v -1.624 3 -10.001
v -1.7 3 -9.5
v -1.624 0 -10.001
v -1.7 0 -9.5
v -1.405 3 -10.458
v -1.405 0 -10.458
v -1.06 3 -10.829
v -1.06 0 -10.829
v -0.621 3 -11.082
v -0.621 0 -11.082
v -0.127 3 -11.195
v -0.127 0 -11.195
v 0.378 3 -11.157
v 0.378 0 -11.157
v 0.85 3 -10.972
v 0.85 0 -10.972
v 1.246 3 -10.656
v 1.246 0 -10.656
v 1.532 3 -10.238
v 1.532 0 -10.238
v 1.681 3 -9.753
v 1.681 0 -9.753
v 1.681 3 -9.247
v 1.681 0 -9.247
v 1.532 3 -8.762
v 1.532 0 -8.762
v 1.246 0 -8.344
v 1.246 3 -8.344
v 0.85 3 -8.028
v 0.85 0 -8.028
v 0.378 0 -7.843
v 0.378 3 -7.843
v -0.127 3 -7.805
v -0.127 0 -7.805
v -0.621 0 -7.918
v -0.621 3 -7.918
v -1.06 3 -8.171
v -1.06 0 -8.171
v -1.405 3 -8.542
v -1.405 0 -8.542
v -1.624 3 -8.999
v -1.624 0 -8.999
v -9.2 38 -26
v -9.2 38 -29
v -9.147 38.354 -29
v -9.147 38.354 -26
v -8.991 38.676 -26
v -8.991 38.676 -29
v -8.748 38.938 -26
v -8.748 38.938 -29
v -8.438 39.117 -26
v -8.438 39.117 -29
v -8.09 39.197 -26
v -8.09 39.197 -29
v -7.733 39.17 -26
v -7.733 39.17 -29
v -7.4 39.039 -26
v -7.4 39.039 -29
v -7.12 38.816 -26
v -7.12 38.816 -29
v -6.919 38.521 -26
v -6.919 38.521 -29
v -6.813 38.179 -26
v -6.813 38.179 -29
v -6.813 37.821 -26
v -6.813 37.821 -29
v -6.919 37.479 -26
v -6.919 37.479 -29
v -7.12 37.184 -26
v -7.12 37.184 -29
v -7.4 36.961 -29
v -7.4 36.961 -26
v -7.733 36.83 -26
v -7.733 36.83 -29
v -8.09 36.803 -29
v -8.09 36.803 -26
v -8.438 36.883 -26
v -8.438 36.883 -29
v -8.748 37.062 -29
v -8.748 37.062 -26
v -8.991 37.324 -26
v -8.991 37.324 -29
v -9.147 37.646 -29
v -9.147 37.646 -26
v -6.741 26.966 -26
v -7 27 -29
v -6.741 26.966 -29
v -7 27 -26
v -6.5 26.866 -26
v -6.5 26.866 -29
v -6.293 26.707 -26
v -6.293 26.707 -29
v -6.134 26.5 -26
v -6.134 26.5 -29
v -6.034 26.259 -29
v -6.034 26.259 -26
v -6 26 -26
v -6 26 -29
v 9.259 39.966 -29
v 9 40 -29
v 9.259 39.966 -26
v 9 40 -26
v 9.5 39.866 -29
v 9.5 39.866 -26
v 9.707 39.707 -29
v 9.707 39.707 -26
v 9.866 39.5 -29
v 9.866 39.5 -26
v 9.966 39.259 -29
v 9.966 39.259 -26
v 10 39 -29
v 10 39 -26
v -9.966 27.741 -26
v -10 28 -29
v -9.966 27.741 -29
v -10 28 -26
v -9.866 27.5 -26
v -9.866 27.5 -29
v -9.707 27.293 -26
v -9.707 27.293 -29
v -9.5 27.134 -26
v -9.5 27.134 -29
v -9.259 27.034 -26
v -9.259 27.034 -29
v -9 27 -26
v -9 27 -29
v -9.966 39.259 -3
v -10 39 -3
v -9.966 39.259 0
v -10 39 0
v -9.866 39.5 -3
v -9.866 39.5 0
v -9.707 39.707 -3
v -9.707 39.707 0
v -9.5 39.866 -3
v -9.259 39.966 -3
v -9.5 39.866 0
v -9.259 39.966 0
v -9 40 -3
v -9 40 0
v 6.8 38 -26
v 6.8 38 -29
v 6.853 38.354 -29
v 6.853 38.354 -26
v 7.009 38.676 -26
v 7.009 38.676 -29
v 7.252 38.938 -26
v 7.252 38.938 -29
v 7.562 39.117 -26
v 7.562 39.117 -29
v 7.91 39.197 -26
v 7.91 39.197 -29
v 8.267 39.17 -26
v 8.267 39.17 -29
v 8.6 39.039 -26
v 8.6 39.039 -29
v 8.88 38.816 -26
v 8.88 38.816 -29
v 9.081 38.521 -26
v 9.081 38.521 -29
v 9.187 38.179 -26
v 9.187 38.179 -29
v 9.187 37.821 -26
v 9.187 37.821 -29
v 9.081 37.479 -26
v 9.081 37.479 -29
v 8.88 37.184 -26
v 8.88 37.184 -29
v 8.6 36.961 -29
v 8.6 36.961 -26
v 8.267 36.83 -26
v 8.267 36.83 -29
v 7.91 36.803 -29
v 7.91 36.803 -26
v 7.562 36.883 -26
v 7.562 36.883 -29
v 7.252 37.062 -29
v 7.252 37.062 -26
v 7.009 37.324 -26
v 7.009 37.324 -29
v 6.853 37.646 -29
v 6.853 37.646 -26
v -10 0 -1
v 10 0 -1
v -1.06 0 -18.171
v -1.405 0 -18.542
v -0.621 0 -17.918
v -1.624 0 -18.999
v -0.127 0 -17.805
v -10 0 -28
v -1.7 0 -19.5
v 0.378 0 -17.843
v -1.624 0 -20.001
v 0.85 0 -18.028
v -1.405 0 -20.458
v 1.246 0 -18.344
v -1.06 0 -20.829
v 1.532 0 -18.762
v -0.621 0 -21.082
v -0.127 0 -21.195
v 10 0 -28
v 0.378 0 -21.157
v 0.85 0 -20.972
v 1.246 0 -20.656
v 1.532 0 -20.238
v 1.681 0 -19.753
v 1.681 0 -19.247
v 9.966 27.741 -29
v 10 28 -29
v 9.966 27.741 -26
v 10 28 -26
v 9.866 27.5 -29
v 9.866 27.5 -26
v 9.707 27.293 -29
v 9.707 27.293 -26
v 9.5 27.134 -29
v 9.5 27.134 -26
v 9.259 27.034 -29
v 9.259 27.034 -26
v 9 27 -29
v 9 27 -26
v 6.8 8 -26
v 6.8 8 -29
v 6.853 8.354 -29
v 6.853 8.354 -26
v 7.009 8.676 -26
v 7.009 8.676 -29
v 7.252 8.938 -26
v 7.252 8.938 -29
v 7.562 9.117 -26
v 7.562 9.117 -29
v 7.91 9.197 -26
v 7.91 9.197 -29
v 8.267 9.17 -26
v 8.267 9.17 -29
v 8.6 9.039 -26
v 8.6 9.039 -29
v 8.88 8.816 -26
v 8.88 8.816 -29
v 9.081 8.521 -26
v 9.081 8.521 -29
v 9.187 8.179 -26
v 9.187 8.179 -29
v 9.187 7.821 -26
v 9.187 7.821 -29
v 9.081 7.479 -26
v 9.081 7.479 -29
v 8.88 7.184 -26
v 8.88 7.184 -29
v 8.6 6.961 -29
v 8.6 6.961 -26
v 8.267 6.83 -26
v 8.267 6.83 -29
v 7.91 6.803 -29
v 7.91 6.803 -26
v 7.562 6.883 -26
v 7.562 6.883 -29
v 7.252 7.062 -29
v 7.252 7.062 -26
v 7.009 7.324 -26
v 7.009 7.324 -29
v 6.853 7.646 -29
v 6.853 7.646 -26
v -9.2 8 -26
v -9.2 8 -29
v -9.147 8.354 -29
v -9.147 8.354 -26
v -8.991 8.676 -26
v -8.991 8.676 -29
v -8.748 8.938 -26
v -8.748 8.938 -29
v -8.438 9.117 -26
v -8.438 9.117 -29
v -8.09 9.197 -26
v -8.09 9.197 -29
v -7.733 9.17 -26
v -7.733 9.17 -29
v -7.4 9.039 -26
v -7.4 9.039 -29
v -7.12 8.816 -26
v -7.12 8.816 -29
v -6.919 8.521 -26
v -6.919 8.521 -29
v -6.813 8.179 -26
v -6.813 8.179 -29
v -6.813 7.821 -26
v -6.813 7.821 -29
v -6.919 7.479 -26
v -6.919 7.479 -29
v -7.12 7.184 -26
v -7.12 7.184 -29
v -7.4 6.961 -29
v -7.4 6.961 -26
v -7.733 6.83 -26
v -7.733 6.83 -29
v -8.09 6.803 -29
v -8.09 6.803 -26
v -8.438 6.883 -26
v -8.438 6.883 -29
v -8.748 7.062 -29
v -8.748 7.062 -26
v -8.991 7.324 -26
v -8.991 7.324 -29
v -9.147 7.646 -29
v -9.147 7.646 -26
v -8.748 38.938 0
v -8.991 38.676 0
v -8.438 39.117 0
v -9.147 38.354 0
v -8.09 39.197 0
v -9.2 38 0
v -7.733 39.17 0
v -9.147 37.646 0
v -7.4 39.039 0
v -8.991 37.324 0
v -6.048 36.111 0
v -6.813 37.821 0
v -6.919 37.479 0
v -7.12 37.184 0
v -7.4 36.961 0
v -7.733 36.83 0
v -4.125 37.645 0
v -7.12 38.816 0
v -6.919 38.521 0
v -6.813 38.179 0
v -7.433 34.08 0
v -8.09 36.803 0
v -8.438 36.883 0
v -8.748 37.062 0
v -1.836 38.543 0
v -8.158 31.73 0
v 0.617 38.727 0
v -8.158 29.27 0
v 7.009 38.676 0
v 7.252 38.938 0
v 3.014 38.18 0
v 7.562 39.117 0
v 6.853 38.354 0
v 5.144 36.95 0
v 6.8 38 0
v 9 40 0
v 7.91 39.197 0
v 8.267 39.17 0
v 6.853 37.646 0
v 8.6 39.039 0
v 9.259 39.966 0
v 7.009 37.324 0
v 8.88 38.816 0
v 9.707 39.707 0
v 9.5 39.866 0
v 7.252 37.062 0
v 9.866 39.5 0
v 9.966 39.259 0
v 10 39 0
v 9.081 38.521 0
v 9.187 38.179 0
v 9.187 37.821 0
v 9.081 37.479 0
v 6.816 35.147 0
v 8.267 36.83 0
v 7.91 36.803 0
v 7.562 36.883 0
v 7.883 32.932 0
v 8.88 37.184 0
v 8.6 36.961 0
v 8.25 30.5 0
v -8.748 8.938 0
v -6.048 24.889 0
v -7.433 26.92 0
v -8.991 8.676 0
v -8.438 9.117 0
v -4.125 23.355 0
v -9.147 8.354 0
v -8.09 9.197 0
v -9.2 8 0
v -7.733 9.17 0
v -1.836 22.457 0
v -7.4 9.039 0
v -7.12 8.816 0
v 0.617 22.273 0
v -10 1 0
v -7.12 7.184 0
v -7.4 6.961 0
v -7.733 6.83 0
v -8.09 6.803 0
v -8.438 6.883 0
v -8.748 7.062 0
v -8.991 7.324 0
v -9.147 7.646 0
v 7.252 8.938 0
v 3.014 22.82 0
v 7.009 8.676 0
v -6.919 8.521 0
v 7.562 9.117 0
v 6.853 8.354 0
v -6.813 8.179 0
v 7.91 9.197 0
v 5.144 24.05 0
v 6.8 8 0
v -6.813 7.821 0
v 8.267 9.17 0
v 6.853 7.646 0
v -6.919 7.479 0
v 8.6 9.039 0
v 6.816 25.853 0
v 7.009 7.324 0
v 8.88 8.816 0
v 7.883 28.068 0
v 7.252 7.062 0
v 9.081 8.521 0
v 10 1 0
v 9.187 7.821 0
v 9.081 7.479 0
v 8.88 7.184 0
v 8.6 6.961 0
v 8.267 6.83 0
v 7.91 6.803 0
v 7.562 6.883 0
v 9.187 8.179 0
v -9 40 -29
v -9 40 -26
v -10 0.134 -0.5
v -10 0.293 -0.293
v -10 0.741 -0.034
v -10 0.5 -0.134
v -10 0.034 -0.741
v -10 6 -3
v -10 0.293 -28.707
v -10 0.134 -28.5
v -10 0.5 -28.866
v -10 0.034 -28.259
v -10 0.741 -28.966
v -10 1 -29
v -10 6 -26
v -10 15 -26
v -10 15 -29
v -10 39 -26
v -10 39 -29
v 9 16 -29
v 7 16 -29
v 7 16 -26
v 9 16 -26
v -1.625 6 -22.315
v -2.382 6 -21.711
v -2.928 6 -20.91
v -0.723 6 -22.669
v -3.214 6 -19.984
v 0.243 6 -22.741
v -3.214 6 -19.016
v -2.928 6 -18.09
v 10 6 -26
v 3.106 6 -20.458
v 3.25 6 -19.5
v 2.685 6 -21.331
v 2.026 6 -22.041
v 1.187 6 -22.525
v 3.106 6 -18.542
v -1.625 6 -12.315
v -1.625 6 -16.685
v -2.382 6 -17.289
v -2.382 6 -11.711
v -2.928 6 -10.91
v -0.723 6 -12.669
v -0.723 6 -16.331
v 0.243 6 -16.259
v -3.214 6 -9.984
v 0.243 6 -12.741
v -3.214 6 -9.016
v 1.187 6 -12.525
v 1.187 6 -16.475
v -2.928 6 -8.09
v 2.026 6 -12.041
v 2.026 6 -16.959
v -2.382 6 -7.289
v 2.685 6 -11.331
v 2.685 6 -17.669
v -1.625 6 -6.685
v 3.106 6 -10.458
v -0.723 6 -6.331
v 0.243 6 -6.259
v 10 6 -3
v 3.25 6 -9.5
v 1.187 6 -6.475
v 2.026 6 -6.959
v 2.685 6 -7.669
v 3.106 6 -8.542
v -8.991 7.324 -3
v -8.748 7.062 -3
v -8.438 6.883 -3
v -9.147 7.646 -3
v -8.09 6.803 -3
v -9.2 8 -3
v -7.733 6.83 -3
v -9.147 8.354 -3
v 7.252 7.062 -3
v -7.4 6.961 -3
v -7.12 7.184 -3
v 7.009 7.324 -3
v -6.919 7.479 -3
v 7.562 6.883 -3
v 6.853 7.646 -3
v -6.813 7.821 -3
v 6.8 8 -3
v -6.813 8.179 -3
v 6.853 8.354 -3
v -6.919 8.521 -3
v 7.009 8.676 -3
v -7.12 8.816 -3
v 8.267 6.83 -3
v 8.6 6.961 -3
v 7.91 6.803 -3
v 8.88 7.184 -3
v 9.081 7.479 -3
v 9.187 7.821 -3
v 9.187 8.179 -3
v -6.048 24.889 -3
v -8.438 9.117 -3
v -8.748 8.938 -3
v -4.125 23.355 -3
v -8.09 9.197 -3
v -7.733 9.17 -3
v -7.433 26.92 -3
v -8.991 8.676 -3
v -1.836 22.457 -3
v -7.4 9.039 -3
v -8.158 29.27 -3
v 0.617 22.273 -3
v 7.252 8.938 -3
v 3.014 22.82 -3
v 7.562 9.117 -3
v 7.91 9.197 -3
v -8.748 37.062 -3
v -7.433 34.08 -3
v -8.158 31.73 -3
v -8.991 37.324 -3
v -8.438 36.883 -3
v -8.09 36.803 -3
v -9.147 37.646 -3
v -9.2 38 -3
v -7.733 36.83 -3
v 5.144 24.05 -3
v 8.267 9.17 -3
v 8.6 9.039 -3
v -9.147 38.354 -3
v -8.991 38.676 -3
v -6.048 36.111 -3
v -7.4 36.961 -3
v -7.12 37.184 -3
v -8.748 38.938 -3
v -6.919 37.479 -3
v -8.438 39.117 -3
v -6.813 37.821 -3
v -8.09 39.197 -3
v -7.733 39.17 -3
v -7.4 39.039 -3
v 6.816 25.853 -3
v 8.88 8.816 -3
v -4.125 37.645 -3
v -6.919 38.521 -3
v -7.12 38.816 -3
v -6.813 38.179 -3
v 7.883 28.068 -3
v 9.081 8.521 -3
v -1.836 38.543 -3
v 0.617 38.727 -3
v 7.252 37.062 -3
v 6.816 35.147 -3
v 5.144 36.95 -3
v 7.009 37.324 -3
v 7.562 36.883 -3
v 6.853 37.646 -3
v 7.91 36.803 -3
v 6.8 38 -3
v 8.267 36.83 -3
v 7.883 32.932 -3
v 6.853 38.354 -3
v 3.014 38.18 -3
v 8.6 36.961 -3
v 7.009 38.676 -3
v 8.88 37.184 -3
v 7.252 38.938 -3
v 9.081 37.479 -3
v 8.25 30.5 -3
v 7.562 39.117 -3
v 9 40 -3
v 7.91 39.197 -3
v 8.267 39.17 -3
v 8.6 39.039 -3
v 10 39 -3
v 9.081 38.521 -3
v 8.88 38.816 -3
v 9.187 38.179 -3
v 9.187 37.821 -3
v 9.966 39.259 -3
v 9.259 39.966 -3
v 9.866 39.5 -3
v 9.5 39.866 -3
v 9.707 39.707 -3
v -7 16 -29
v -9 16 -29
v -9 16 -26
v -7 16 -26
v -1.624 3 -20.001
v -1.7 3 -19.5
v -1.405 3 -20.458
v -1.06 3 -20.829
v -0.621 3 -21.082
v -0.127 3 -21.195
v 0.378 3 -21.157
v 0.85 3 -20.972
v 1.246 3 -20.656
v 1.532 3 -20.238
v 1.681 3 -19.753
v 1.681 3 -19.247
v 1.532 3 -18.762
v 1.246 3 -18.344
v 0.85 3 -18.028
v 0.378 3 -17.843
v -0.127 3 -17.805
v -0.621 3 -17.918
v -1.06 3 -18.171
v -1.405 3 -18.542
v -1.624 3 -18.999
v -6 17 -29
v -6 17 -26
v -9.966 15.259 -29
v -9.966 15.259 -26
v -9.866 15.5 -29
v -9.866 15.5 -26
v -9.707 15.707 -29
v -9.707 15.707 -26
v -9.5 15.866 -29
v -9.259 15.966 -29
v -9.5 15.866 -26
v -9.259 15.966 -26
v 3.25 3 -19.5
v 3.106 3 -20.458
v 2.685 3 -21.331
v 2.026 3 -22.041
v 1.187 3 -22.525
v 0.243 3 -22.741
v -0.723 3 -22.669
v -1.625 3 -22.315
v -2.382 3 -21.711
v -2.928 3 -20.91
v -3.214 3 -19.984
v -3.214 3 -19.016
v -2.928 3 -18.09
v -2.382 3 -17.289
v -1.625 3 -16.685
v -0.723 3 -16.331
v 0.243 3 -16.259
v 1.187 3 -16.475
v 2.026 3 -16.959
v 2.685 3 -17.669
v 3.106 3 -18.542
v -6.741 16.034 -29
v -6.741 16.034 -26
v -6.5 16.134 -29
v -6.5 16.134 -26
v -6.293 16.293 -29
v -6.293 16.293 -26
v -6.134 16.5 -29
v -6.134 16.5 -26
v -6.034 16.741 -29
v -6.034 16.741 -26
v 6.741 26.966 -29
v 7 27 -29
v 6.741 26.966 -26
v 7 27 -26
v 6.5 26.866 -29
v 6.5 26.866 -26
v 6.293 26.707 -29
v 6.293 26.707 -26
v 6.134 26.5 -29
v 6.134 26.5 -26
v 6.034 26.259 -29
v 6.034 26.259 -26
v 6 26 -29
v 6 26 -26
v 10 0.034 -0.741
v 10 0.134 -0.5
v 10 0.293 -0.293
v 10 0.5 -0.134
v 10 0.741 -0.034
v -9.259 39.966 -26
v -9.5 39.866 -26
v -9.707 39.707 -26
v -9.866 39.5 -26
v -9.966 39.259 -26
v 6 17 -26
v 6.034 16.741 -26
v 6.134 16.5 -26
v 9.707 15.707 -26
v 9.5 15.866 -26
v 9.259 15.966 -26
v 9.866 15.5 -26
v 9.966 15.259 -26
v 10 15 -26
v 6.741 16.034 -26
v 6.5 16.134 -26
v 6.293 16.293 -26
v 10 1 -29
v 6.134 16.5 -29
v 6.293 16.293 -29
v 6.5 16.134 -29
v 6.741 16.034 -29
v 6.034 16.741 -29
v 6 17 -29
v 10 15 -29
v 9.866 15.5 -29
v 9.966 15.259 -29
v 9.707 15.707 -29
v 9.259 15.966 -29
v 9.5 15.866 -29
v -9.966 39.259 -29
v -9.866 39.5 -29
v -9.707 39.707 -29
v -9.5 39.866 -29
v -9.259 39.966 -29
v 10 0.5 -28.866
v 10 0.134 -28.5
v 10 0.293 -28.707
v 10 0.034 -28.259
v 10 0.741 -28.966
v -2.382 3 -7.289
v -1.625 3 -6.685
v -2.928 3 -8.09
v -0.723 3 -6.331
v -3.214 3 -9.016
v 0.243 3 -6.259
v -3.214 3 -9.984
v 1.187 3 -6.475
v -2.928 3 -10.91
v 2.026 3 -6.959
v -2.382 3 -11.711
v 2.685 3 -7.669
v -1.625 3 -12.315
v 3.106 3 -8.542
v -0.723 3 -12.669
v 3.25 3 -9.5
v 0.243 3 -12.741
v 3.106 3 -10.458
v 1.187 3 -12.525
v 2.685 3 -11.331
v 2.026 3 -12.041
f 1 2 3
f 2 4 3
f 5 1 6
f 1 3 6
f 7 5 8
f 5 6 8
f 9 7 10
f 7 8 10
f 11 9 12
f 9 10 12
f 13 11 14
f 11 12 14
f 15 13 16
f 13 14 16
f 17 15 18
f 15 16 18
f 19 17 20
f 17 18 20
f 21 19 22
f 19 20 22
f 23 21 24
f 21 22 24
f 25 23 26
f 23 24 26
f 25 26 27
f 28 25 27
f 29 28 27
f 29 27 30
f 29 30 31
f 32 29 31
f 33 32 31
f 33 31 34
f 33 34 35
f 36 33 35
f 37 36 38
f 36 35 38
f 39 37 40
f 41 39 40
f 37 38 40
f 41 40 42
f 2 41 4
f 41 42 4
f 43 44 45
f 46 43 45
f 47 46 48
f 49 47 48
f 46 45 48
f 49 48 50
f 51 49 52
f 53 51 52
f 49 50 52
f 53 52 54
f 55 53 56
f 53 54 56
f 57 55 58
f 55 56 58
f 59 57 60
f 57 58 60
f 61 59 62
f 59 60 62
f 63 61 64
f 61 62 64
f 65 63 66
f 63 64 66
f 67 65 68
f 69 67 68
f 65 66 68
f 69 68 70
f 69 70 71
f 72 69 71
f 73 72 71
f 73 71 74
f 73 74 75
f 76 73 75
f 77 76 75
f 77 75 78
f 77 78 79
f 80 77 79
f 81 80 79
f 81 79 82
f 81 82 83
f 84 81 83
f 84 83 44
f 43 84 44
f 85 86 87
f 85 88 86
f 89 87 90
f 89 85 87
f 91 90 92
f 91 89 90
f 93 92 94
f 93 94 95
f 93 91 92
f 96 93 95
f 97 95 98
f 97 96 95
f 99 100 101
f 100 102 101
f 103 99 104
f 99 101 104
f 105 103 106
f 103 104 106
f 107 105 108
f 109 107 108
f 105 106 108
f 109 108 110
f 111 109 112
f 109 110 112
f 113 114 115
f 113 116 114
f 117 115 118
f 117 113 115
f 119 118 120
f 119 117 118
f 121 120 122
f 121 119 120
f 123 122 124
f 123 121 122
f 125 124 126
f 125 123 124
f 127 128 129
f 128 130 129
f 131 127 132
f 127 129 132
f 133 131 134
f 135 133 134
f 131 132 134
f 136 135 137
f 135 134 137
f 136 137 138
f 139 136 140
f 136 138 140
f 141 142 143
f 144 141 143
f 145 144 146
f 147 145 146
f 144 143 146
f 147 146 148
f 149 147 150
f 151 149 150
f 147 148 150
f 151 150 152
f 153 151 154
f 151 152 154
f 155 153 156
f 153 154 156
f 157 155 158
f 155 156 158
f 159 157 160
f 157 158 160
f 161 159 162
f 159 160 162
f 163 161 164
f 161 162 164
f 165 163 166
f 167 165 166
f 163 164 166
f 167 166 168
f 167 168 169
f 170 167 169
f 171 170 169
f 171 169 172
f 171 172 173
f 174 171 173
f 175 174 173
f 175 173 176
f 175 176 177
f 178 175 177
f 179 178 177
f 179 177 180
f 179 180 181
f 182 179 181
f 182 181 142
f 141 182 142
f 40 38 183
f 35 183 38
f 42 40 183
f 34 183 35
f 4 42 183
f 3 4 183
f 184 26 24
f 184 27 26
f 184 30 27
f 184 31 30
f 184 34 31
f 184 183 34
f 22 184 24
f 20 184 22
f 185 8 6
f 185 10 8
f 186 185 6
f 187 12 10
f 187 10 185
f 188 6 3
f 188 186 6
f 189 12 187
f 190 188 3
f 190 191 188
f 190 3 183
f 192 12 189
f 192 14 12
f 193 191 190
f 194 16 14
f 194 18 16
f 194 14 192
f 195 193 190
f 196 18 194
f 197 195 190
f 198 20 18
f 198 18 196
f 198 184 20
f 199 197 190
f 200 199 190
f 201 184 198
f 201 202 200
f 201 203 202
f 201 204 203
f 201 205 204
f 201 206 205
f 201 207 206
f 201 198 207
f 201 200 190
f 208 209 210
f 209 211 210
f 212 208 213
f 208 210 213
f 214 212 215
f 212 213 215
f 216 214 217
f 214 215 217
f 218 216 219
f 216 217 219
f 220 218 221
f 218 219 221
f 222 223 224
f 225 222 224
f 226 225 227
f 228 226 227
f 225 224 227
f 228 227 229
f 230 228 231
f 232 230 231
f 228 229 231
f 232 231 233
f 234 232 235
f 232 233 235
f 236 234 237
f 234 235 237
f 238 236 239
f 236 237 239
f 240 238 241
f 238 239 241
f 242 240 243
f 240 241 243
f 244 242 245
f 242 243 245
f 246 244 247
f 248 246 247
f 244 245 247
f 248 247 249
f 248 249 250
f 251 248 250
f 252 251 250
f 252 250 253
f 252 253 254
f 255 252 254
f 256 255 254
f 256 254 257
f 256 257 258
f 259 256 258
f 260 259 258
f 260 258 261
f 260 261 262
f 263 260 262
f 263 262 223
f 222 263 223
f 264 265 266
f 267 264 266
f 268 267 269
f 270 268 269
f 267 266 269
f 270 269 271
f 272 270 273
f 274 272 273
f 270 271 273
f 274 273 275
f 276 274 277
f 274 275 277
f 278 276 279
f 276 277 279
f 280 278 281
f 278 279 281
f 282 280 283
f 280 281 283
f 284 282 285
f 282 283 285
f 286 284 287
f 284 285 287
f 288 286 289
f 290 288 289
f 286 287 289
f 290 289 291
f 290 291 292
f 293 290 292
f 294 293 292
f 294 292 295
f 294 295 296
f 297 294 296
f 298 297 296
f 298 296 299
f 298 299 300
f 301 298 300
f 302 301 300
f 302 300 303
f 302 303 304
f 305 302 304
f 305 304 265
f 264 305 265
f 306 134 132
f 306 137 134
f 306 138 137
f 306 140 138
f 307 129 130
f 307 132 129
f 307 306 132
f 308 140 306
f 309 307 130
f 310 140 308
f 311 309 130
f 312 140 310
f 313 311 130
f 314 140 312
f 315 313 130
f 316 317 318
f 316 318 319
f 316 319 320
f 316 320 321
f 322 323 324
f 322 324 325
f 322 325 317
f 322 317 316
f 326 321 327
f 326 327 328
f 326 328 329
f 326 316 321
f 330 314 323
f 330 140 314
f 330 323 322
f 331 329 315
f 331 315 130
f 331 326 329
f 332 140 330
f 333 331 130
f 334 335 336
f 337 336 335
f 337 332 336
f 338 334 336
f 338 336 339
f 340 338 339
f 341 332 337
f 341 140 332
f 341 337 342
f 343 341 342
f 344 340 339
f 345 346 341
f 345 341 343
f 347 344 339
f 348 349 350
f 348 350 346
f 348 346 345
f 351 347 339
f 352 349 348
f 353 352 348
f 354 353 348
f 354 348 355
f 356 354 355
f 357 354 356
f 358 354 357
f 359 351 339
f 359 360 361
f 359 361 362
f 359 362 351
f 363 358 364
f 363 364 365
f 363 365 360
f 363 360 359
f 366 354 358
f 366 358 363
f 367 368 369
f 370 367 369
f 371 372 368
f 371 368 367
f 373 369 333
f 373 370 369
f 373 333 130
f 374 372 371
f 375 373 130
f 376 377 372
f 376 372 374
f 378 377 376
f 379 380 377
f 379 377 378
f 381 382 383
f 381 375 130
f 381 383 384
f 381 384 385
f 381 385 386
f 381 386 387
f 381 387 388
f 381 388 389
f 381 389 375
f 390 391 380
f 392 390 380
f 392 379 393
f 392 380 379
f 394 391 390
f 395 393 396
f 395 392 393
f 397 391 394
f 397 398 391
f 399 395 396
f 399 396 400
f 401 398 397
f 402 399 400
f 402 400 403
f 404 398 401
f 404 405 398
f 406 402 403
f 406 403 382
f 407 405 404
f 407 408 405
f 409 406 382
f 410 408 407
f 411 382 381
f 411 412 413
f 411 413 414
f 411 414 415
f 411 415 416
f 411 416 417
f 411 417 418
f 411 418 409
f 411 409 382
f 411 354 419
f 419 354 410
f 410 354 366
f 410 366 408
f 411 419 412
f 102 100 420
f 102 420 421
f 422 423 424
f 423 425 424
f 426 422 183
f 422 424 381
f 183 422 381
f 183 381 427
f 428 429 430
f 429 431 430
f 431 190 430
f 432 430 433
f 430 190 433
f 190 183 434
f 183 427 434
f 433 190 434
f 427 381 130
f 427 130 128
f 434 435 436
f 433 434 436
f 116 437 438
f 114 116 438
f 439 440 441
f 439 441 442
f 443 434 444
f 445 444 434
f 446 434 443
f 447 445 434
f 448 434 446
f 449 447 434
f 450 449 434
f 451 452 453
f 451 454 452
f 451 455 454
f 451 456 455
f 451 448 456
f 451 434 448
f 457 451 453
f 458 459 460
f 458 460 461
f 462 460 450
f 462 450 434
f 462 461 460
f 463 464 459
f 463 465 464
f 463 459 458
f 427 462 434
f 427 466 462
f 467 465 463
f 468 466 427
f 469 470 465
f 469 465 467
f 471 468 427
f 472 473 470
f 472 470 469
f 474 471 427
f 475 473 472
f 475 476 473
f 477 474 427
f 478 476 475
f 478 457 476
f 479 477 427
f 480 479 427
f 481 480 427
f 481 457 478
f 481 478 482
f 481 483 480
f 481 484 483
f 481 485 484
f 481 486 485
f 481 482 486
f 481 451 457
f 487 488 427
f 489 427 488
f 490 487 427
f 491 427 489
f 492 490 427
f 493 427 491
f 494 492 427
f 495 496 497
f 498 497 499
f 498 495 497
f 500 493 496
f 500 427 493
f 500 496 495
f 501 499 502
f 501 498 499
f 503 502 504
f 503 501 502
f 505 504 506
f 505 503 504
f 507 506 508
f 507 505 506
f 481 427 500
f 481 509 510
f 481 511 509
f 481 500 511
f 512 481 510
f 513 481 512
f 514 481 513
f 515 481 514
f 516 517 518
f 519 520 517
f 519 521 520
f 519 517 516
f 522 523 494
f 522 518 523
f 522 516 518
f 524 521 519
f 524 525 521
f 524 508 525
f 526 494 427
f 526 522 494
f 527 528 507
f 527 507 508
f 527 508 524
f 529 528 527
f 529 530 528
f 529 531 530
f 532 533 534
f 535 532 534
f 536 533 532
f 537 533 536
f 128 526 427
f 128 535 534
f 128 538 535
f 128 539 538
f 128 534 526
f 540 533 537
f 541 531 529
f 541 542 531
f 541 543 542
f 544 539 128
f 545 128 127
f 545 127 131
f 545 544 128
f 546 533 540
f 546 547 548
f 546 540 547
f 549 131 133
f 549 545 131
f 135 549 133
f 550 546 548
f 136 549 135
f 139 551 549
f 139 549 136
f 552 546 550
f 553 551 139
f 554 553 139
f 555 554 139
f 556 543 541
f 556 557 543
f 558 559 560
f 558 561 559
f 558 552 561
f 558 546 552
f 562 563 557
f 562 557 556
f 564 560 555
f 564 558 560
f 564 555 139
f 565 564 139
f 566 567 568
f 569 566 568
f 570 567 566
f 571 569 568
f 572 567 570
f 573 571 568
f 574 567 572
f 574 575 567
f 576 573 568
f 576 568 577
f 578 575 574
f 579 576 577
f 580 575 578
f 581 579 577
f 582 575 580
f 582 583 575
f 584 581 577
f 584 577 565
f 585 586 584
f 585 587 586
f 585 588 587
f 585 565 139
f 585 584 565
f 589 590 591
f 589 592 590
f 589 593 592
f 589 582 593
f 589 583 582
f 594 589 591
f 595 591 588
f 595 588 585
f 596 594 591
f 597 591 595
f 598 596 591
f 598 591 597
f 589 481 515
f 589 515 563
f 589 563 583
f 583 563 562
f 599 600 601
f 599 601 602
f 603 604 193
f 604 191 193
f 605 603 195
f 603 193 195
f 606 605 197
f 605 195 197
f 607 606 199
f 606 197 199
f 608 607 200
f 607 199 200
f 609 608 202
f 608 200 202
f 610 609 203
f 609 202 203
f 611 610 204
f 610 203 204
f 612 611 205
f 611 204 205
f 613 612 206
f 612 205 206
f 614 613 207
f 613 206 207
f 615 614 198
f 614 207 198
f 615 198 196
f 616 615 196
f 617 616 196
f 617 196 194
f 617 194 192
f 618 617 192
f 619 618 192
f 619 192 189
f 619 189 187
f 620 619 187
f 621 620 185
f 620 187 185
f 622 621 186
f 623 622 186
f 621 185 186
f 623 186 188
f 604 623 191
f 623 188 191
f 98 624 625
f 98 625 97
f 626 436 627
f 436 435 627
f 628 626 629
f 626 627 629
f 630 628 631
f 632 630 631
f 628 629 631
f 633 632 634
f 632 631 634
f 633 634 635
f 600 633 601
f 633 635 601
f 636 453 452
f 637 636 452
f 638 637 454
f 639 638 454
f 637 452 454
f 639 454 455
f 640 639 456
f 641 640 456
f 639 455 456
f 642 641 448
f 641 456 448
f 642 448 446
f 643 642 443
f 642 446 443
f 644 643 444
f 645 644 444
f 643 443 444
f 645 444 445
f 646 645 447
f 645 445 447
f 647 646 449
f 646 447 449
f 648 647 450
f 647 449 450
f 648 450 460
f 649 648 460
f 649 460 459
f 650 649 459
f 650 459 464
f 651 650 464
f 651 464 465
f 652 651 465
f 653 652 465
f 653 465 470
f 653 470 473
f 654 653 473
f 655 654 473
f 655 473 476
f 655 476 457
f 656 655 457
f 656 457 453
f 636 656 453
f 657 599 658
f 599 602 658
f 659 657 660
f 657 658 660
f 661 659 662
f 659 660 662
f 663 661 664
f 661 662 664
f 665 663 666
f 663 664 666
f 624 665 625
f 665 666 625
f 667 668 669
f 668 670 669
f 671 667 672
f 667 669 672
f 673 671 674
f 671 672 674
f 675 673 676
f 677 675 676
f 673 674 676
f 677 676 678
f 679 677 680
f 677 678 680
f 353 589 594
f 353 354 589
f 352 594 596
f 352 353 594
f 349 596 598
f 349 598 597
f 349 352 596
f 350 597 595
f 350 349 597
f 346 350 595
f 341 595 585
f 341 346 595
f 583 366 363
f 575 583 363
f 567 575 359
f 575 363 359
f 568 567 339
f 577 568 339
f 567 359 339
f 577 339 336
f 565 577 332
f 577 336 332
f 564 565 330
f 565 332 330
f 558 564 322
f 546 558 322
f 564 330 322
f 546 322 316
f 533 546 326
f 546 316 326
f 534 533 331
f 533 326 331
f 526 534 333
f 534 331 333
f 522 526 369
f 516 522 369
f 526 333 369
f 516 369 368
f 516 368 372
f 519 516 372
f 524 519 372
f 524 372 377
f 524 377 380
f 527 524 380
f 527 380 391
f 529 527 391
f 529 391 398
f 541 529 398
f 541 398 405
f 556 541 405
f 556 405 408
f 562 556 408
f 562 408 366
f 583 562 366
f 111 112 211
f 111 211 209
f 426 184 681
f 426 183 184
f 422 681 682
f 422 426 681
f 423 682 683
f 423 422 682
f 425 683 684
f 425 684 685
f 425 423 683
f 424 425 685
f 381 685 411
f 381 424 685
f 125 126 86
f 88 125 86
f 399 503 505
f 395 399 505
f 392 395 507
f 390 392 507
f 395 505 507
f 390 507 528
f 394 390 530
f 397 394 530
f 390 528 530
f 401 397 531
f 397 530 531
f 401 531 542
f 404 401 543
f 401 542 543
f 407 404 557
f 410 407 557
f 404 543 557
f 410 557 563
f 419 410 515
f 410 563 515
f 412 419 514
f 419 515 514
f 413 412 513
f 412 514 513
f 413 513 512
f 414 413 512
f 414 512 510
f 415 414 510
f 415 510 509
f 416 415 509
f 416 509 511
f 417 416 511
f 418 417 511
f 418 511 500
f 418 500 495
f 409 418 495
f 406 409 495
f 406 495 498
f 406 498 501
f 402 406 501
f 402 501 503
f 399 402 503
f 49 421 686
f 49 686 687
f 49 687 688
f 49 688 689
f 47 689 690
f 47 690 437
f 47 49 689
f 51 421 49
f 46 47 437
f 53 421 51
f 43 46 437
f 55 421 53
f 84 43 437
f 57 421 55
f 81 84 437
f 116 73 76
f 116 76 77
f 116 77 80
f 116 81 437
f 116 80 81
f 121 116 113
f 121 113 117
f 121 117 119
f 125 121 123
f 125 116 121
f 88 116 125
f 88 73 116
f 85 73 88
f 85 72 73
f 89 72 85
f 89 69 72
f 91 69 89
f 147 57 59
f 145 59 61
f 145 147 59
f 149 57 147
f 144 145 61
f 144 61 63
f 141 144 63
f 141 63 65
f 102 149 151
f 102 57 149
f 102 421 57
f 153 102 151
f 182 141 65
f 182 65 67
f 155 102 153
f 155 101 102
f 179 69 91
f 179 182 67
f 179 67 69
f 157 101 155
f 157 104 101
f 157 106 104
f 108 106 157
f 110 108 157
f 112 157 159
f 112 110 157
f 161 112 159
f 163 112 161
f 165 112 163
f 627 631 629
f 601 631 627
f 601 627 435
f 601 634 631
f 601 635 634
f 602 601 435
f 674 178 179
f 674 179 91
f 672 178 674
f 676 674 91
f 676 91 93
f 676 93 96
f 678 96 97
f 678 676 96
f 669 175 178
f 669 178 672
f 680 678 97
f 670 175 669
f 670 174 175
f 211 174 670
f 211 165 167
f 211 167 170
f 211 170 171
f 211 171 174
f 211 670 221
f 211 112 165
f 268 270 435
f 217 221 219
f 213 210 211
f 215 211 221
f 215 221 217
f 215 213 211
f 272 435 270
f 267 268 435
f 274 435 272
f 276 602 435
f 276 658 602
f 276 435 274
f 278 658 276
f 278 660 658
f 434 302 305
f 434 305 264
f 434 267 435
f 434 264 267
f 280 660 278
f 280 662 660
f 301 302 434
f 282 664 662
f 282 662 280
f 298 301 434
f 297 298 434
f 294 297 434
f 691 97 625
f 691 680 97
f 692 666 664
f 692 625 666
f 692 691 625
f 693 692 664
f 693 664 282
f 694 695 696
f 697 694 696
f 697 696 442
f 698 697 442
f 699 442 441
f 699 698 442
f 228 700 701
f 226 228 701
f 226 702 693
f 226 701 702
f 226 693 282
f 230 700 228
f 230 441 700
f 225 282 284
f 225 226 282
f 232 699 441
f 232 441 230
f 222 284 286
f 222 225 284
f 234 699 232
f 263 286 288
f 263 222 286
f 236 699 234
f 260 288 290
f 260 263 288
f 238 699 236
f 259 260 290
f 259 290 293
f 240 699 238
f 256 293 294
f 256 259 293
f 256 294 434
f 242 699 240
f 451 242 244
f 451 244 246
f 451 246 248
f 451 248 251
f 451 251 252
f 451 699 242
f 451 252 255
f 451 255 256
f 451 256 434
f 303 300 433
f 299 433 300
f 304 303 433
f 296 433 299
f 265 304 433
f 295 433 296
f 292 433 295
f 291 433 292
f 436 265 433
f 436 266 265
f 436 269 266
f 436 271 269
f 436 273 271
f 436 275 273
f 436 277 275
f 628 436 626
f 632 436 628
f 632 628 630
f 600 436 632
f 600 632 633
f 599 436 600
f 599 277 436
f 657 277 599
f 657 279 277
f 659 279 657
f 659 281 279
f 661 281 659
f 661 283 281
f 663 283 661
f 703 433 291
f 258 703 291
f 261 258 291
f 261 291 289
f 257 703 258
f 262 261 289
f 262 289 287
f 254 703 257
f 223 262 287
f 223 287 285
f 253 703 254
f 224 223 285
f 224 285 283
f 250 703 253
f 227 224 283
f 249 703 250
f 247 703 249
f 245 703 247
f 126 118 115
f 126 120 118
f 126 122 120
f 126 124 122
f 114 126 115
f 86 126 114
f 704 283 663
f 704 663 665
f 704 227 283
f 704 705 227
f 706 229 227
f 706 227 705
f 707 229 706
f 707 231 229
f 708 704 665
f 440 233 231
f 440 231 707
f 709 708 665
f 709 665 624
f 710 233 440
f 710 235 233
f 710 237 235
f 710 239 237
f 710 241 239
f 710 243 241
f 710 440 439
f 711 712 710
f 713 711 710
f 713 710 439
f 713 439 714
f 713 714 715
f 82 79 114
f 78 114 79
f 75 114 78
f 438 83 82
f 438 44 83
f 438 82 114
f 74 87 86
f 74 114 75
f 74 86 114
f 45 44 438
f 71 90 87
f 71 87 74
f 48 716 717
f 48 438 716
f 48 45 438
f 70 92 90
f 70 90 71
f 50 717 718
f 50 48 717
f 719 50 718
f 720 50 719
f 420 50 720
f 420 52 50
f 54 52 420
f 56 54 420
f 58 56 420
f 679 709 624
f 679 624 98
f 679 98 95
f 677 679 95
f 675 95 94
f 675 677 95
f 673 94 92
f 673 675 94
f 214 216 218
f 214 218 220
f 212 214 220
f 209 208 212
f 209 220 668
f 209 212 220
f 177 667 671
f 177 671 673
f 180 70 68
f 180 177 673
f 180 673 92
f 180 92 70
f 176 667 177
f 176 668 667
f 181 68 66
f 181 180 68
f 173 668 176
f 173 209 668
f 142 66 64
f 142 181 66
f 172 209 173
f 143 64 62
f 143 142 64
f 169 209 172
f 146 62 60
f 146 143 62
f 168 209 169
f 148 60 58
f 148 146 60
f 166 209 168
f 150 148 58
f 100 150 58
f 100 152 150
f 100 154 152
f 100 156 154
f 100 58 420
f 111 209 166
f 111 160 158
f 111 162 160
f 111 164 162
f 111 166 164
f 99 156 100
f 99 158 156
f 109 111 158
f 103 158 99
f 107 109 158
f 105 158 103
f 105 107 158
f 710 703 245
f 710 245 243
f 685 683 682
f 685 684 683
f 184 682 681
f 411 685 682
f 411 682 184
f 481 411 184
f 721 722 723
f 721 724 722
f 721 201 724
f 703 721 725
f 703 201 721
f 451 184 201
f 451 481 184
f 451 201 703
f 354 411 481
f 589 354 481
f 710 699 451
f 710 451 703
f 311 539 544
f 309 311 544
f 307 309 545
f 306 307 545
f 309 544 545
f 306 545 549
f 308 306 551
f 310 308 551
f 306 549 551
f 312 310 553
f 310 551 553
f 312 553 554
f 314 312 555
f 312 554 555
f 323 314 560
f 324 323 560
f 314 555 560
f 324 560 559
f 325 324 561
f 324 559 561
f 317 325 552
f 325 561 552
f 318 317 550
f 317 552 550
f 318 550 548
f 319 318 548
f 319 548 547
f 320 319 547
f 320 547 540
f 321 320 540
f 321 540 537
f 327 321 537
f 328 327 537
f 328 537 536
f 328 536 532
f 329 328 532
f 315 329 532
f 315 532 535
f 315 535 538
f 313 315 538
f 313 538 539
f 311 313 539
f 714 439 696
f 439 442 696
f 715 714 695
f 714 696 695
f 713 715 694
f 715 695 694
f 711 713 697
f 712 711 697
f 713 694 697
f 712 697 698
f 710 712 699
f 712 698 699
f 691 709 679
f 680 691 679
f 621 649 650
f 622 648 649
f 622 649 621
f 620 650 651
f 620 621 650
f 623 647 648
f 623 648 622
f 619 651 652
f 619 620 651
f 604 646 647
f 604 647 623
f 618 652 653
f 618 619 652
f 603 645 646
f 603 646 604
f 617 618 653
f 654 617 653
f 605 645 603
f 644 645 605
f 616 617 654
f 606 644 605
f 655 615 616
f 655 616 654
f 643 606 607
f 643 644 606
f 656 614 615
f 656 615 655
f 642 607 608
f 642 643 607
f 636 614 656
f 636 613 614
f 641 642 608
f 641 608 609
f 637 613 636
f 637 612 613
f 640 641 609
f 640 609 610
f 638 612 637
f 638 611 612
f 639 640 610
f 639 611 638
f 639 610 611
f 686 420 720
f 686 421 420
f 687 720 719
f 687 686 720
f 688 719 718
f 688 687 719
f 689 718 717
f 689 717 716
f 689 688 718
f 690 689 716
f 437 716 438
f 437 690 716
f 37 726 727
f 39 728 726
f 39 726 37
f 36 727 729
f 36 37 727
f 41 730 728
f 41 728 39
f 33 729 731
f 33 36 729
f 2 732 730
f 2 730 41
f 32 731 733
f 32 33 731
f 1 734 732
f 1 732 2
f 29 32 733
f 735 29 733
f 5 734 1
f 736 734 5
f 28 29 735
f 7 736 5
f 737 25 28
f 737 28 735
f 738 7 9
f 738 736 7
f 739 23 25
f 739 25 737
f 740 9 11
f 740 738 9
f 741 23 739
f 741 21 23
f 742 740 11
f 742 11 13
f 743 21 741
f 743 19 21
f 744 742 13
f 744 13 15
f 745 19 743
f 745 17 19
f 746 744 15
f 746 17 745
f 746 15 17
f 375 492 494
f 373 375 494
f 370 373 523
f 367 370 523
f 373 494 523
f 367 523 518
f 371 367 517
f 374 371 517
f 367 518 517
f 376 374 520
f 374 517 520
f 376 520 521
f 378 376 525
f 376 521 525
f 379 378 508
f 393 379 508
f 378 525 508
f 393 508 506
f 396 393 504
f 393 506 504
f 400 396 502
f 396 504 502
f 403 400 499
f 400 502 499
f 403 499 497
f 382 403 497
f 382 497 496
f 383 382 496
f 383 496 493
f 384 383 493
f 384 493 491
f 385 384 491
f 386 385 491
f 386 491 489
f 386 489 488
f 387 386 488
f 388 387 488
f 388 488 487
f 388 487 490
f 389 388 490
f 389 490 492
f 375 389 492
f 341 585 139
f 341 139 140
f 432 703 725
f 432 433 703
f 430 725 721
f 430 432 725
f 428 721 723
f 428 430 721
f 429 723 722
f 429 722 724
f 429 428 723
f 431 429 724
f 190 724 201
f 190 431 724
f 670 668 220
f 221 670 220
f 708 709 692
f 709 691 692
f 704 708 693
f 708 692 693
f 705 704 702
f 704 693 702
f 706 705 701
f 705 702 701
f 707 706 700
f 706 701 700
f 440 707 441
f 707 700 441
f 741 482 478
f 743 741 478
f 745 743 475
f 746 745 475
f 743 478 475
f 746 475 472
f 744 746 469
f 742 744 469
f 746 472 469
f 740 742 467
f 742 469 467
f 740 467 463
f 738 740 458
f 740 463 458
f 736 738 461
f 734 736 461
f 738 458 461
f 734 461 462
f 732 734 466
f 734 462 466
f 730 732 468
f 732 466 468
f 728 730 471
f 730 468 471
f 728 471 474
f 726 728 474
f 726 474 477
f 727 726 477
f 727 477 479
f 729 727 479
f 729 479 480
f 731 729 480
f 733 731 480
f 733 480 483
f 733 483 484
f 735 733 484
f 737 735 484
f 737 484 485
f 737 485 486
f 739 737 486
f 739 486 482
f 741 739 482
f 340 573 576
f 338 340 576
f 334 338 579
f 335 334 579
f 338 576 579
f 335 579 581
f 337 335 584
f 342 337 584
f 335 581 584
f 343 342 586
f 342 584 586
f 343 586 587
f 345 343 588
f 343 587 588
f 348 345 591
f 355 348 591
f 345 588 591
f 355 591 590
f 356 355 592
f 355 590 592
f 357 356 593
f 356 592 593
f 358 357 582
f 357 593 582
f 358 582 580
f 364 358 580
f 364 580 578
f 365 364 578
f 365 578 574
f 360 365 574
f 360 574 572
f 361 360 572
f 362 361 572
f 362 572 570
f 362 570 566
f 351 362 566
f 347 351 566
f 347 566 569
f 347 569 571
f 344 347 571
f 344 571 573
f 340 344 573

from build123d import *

# Parameters (mm, degrees)
BOSS_EXTRUDE1_DEPTH            = 10
CUT_EXTRUDE1_REACH             = 52.408
SKETCH2_R                      = 8.25
M2_CLEARANCE_HOLE1_D           = 2.4
CBORE_FOR_M3_SHCS1_D           = 3.4
CBORE_FOR_M3_SHCS1_CBORE_D     = 6.5
CBORE_FOR_M3_SHCS1_CBORE_DEPTH = 3
CUT_EXTRUDE2_REACH             = 52.408
SKETCH7_W                      = 4
SKETCH7_H                      = 11
FILLET1_R                      = 1


with BuildPart() as part:
    # Sketch1 → Boss-Extrude1 (new, symmetric)
    with BuildSketch(Plane(origin=(0, 0, 0), x_dir=(0, 0, -1), z_dir=(1, 0, 0))):
        Polygon((29, 40), (26, 40), (26, 6), (3, 6), (3, 40), (0, 40), (0, 0), (29, 0), align=None)
    extrude(amount=BOSS_EXTRUDE1_DEPTH, both=True)

    # Sketch2 → Cut-Extrude1 (cut, up to next)
    with BuildSketch(Plane.XY, mode=Mode.PRIVATE) as cut_extrude1_sk1:
        with Locations((0, 30.5)):
            Circle(SKETCH2_R)
    cut_extrude1_tool1 = extrude(cut_extrude1_sk1.sketch, amount=-CUT_EXTRUDE1_REACH, mode=Mode.PRIVATE) & part.part
    add(cut_extrude1_tool1.solids().sort_by_distance((0, 30.5, 0))[0], mode=Mode.SUBTRACT)

    # M2 Clearance Hole1 (through all)
    with Locations(Plane.XY):
        with Locations((-8, 8), (8, 8), (8, 38), (-8, 38)):
            Hole(M2_CLEARANCE_HOLE1_D / 2)

    # CBORE for M3 SHCS1 (through all)
    with Locations(Plane(origin=(0, 6, 0), x_dir=(1, 0, 0), z_dir=(0, 1, 0))):
        with Locations((0, 19.5), (0, 9.5)):
            CounterBoreHole(CBORE_FOR_M3_SHCS1_D / 2, CBORE_FOR_M3_SHCS1_CBORE_D / 2, CBORE_FOR_M3_SHCS1_CBORE_DEPTH)

    # Sketch7 → Cut-Extrude2 (cut, up to next)
    with BuildSketch(Plane.XY.offset(-29), mode=Mode.PRIVATE) as cut_extrude2_sk1:
        with Locations((8, 21.5)):
            Rectangle(SKETCH7_W, SKETCH7_H)
    cut_extrude2_tool1 = extrude(cut_extrude2_sk1.sketch, amount=CUT_EXTRUDE2_REACH, mode=Mode.PRIVATE) & part.part
    # Sketch7 → Cut-Extrude2 (cut, up to next)
    with BuildSketch(Plane.XY.offset(-29), mode=Mode.PRIVATE) as cut_extrude2_sk2:
        with Locations((-8, 21.5)):
            Rectangle(SKETCH7_W, SKETCH7_H)
    cut_extrude2_tool2 = extrude(cut_extrude2_sk2.sketch, amount=CUT_EXTRUDE2_REACH, mode=Mode.PRIVATE) & part.part
    add(cut_extrude2_tool1.solids().sort_by_distance((8, 21.5, -29))[0], mode=Mode.SUBTRACT)
    add(cut_extrude2_tool2.solids().sort_by_distance((-8, 21.5, -29))[0], mode=Mode.SUBTRACT)

    # Fillet1
    fillet1_edges = [part.edges().sort_by_distance(p)[0] for p in [
        (-6, 27, -27.5),
        (-10, 27, -27.5),
        (-10, 16, -27.5),
        (-6, 16, -27.5),
        (-10, 40, -1.5),
        (-10, 40, -27.5),
        (0, 0, -29),
        (0, 0, 0),
        (10, 40, -1.5),
        (10, 40, -27.5),
        (10, 16, -27.5),
        (10, 27, -27.5),
        (6, 27, -27.5),
        (6, 16, -27.5),
    ]]
    fillet(fillet1_edges, radius=FILLET1_R)


solid = part.part
